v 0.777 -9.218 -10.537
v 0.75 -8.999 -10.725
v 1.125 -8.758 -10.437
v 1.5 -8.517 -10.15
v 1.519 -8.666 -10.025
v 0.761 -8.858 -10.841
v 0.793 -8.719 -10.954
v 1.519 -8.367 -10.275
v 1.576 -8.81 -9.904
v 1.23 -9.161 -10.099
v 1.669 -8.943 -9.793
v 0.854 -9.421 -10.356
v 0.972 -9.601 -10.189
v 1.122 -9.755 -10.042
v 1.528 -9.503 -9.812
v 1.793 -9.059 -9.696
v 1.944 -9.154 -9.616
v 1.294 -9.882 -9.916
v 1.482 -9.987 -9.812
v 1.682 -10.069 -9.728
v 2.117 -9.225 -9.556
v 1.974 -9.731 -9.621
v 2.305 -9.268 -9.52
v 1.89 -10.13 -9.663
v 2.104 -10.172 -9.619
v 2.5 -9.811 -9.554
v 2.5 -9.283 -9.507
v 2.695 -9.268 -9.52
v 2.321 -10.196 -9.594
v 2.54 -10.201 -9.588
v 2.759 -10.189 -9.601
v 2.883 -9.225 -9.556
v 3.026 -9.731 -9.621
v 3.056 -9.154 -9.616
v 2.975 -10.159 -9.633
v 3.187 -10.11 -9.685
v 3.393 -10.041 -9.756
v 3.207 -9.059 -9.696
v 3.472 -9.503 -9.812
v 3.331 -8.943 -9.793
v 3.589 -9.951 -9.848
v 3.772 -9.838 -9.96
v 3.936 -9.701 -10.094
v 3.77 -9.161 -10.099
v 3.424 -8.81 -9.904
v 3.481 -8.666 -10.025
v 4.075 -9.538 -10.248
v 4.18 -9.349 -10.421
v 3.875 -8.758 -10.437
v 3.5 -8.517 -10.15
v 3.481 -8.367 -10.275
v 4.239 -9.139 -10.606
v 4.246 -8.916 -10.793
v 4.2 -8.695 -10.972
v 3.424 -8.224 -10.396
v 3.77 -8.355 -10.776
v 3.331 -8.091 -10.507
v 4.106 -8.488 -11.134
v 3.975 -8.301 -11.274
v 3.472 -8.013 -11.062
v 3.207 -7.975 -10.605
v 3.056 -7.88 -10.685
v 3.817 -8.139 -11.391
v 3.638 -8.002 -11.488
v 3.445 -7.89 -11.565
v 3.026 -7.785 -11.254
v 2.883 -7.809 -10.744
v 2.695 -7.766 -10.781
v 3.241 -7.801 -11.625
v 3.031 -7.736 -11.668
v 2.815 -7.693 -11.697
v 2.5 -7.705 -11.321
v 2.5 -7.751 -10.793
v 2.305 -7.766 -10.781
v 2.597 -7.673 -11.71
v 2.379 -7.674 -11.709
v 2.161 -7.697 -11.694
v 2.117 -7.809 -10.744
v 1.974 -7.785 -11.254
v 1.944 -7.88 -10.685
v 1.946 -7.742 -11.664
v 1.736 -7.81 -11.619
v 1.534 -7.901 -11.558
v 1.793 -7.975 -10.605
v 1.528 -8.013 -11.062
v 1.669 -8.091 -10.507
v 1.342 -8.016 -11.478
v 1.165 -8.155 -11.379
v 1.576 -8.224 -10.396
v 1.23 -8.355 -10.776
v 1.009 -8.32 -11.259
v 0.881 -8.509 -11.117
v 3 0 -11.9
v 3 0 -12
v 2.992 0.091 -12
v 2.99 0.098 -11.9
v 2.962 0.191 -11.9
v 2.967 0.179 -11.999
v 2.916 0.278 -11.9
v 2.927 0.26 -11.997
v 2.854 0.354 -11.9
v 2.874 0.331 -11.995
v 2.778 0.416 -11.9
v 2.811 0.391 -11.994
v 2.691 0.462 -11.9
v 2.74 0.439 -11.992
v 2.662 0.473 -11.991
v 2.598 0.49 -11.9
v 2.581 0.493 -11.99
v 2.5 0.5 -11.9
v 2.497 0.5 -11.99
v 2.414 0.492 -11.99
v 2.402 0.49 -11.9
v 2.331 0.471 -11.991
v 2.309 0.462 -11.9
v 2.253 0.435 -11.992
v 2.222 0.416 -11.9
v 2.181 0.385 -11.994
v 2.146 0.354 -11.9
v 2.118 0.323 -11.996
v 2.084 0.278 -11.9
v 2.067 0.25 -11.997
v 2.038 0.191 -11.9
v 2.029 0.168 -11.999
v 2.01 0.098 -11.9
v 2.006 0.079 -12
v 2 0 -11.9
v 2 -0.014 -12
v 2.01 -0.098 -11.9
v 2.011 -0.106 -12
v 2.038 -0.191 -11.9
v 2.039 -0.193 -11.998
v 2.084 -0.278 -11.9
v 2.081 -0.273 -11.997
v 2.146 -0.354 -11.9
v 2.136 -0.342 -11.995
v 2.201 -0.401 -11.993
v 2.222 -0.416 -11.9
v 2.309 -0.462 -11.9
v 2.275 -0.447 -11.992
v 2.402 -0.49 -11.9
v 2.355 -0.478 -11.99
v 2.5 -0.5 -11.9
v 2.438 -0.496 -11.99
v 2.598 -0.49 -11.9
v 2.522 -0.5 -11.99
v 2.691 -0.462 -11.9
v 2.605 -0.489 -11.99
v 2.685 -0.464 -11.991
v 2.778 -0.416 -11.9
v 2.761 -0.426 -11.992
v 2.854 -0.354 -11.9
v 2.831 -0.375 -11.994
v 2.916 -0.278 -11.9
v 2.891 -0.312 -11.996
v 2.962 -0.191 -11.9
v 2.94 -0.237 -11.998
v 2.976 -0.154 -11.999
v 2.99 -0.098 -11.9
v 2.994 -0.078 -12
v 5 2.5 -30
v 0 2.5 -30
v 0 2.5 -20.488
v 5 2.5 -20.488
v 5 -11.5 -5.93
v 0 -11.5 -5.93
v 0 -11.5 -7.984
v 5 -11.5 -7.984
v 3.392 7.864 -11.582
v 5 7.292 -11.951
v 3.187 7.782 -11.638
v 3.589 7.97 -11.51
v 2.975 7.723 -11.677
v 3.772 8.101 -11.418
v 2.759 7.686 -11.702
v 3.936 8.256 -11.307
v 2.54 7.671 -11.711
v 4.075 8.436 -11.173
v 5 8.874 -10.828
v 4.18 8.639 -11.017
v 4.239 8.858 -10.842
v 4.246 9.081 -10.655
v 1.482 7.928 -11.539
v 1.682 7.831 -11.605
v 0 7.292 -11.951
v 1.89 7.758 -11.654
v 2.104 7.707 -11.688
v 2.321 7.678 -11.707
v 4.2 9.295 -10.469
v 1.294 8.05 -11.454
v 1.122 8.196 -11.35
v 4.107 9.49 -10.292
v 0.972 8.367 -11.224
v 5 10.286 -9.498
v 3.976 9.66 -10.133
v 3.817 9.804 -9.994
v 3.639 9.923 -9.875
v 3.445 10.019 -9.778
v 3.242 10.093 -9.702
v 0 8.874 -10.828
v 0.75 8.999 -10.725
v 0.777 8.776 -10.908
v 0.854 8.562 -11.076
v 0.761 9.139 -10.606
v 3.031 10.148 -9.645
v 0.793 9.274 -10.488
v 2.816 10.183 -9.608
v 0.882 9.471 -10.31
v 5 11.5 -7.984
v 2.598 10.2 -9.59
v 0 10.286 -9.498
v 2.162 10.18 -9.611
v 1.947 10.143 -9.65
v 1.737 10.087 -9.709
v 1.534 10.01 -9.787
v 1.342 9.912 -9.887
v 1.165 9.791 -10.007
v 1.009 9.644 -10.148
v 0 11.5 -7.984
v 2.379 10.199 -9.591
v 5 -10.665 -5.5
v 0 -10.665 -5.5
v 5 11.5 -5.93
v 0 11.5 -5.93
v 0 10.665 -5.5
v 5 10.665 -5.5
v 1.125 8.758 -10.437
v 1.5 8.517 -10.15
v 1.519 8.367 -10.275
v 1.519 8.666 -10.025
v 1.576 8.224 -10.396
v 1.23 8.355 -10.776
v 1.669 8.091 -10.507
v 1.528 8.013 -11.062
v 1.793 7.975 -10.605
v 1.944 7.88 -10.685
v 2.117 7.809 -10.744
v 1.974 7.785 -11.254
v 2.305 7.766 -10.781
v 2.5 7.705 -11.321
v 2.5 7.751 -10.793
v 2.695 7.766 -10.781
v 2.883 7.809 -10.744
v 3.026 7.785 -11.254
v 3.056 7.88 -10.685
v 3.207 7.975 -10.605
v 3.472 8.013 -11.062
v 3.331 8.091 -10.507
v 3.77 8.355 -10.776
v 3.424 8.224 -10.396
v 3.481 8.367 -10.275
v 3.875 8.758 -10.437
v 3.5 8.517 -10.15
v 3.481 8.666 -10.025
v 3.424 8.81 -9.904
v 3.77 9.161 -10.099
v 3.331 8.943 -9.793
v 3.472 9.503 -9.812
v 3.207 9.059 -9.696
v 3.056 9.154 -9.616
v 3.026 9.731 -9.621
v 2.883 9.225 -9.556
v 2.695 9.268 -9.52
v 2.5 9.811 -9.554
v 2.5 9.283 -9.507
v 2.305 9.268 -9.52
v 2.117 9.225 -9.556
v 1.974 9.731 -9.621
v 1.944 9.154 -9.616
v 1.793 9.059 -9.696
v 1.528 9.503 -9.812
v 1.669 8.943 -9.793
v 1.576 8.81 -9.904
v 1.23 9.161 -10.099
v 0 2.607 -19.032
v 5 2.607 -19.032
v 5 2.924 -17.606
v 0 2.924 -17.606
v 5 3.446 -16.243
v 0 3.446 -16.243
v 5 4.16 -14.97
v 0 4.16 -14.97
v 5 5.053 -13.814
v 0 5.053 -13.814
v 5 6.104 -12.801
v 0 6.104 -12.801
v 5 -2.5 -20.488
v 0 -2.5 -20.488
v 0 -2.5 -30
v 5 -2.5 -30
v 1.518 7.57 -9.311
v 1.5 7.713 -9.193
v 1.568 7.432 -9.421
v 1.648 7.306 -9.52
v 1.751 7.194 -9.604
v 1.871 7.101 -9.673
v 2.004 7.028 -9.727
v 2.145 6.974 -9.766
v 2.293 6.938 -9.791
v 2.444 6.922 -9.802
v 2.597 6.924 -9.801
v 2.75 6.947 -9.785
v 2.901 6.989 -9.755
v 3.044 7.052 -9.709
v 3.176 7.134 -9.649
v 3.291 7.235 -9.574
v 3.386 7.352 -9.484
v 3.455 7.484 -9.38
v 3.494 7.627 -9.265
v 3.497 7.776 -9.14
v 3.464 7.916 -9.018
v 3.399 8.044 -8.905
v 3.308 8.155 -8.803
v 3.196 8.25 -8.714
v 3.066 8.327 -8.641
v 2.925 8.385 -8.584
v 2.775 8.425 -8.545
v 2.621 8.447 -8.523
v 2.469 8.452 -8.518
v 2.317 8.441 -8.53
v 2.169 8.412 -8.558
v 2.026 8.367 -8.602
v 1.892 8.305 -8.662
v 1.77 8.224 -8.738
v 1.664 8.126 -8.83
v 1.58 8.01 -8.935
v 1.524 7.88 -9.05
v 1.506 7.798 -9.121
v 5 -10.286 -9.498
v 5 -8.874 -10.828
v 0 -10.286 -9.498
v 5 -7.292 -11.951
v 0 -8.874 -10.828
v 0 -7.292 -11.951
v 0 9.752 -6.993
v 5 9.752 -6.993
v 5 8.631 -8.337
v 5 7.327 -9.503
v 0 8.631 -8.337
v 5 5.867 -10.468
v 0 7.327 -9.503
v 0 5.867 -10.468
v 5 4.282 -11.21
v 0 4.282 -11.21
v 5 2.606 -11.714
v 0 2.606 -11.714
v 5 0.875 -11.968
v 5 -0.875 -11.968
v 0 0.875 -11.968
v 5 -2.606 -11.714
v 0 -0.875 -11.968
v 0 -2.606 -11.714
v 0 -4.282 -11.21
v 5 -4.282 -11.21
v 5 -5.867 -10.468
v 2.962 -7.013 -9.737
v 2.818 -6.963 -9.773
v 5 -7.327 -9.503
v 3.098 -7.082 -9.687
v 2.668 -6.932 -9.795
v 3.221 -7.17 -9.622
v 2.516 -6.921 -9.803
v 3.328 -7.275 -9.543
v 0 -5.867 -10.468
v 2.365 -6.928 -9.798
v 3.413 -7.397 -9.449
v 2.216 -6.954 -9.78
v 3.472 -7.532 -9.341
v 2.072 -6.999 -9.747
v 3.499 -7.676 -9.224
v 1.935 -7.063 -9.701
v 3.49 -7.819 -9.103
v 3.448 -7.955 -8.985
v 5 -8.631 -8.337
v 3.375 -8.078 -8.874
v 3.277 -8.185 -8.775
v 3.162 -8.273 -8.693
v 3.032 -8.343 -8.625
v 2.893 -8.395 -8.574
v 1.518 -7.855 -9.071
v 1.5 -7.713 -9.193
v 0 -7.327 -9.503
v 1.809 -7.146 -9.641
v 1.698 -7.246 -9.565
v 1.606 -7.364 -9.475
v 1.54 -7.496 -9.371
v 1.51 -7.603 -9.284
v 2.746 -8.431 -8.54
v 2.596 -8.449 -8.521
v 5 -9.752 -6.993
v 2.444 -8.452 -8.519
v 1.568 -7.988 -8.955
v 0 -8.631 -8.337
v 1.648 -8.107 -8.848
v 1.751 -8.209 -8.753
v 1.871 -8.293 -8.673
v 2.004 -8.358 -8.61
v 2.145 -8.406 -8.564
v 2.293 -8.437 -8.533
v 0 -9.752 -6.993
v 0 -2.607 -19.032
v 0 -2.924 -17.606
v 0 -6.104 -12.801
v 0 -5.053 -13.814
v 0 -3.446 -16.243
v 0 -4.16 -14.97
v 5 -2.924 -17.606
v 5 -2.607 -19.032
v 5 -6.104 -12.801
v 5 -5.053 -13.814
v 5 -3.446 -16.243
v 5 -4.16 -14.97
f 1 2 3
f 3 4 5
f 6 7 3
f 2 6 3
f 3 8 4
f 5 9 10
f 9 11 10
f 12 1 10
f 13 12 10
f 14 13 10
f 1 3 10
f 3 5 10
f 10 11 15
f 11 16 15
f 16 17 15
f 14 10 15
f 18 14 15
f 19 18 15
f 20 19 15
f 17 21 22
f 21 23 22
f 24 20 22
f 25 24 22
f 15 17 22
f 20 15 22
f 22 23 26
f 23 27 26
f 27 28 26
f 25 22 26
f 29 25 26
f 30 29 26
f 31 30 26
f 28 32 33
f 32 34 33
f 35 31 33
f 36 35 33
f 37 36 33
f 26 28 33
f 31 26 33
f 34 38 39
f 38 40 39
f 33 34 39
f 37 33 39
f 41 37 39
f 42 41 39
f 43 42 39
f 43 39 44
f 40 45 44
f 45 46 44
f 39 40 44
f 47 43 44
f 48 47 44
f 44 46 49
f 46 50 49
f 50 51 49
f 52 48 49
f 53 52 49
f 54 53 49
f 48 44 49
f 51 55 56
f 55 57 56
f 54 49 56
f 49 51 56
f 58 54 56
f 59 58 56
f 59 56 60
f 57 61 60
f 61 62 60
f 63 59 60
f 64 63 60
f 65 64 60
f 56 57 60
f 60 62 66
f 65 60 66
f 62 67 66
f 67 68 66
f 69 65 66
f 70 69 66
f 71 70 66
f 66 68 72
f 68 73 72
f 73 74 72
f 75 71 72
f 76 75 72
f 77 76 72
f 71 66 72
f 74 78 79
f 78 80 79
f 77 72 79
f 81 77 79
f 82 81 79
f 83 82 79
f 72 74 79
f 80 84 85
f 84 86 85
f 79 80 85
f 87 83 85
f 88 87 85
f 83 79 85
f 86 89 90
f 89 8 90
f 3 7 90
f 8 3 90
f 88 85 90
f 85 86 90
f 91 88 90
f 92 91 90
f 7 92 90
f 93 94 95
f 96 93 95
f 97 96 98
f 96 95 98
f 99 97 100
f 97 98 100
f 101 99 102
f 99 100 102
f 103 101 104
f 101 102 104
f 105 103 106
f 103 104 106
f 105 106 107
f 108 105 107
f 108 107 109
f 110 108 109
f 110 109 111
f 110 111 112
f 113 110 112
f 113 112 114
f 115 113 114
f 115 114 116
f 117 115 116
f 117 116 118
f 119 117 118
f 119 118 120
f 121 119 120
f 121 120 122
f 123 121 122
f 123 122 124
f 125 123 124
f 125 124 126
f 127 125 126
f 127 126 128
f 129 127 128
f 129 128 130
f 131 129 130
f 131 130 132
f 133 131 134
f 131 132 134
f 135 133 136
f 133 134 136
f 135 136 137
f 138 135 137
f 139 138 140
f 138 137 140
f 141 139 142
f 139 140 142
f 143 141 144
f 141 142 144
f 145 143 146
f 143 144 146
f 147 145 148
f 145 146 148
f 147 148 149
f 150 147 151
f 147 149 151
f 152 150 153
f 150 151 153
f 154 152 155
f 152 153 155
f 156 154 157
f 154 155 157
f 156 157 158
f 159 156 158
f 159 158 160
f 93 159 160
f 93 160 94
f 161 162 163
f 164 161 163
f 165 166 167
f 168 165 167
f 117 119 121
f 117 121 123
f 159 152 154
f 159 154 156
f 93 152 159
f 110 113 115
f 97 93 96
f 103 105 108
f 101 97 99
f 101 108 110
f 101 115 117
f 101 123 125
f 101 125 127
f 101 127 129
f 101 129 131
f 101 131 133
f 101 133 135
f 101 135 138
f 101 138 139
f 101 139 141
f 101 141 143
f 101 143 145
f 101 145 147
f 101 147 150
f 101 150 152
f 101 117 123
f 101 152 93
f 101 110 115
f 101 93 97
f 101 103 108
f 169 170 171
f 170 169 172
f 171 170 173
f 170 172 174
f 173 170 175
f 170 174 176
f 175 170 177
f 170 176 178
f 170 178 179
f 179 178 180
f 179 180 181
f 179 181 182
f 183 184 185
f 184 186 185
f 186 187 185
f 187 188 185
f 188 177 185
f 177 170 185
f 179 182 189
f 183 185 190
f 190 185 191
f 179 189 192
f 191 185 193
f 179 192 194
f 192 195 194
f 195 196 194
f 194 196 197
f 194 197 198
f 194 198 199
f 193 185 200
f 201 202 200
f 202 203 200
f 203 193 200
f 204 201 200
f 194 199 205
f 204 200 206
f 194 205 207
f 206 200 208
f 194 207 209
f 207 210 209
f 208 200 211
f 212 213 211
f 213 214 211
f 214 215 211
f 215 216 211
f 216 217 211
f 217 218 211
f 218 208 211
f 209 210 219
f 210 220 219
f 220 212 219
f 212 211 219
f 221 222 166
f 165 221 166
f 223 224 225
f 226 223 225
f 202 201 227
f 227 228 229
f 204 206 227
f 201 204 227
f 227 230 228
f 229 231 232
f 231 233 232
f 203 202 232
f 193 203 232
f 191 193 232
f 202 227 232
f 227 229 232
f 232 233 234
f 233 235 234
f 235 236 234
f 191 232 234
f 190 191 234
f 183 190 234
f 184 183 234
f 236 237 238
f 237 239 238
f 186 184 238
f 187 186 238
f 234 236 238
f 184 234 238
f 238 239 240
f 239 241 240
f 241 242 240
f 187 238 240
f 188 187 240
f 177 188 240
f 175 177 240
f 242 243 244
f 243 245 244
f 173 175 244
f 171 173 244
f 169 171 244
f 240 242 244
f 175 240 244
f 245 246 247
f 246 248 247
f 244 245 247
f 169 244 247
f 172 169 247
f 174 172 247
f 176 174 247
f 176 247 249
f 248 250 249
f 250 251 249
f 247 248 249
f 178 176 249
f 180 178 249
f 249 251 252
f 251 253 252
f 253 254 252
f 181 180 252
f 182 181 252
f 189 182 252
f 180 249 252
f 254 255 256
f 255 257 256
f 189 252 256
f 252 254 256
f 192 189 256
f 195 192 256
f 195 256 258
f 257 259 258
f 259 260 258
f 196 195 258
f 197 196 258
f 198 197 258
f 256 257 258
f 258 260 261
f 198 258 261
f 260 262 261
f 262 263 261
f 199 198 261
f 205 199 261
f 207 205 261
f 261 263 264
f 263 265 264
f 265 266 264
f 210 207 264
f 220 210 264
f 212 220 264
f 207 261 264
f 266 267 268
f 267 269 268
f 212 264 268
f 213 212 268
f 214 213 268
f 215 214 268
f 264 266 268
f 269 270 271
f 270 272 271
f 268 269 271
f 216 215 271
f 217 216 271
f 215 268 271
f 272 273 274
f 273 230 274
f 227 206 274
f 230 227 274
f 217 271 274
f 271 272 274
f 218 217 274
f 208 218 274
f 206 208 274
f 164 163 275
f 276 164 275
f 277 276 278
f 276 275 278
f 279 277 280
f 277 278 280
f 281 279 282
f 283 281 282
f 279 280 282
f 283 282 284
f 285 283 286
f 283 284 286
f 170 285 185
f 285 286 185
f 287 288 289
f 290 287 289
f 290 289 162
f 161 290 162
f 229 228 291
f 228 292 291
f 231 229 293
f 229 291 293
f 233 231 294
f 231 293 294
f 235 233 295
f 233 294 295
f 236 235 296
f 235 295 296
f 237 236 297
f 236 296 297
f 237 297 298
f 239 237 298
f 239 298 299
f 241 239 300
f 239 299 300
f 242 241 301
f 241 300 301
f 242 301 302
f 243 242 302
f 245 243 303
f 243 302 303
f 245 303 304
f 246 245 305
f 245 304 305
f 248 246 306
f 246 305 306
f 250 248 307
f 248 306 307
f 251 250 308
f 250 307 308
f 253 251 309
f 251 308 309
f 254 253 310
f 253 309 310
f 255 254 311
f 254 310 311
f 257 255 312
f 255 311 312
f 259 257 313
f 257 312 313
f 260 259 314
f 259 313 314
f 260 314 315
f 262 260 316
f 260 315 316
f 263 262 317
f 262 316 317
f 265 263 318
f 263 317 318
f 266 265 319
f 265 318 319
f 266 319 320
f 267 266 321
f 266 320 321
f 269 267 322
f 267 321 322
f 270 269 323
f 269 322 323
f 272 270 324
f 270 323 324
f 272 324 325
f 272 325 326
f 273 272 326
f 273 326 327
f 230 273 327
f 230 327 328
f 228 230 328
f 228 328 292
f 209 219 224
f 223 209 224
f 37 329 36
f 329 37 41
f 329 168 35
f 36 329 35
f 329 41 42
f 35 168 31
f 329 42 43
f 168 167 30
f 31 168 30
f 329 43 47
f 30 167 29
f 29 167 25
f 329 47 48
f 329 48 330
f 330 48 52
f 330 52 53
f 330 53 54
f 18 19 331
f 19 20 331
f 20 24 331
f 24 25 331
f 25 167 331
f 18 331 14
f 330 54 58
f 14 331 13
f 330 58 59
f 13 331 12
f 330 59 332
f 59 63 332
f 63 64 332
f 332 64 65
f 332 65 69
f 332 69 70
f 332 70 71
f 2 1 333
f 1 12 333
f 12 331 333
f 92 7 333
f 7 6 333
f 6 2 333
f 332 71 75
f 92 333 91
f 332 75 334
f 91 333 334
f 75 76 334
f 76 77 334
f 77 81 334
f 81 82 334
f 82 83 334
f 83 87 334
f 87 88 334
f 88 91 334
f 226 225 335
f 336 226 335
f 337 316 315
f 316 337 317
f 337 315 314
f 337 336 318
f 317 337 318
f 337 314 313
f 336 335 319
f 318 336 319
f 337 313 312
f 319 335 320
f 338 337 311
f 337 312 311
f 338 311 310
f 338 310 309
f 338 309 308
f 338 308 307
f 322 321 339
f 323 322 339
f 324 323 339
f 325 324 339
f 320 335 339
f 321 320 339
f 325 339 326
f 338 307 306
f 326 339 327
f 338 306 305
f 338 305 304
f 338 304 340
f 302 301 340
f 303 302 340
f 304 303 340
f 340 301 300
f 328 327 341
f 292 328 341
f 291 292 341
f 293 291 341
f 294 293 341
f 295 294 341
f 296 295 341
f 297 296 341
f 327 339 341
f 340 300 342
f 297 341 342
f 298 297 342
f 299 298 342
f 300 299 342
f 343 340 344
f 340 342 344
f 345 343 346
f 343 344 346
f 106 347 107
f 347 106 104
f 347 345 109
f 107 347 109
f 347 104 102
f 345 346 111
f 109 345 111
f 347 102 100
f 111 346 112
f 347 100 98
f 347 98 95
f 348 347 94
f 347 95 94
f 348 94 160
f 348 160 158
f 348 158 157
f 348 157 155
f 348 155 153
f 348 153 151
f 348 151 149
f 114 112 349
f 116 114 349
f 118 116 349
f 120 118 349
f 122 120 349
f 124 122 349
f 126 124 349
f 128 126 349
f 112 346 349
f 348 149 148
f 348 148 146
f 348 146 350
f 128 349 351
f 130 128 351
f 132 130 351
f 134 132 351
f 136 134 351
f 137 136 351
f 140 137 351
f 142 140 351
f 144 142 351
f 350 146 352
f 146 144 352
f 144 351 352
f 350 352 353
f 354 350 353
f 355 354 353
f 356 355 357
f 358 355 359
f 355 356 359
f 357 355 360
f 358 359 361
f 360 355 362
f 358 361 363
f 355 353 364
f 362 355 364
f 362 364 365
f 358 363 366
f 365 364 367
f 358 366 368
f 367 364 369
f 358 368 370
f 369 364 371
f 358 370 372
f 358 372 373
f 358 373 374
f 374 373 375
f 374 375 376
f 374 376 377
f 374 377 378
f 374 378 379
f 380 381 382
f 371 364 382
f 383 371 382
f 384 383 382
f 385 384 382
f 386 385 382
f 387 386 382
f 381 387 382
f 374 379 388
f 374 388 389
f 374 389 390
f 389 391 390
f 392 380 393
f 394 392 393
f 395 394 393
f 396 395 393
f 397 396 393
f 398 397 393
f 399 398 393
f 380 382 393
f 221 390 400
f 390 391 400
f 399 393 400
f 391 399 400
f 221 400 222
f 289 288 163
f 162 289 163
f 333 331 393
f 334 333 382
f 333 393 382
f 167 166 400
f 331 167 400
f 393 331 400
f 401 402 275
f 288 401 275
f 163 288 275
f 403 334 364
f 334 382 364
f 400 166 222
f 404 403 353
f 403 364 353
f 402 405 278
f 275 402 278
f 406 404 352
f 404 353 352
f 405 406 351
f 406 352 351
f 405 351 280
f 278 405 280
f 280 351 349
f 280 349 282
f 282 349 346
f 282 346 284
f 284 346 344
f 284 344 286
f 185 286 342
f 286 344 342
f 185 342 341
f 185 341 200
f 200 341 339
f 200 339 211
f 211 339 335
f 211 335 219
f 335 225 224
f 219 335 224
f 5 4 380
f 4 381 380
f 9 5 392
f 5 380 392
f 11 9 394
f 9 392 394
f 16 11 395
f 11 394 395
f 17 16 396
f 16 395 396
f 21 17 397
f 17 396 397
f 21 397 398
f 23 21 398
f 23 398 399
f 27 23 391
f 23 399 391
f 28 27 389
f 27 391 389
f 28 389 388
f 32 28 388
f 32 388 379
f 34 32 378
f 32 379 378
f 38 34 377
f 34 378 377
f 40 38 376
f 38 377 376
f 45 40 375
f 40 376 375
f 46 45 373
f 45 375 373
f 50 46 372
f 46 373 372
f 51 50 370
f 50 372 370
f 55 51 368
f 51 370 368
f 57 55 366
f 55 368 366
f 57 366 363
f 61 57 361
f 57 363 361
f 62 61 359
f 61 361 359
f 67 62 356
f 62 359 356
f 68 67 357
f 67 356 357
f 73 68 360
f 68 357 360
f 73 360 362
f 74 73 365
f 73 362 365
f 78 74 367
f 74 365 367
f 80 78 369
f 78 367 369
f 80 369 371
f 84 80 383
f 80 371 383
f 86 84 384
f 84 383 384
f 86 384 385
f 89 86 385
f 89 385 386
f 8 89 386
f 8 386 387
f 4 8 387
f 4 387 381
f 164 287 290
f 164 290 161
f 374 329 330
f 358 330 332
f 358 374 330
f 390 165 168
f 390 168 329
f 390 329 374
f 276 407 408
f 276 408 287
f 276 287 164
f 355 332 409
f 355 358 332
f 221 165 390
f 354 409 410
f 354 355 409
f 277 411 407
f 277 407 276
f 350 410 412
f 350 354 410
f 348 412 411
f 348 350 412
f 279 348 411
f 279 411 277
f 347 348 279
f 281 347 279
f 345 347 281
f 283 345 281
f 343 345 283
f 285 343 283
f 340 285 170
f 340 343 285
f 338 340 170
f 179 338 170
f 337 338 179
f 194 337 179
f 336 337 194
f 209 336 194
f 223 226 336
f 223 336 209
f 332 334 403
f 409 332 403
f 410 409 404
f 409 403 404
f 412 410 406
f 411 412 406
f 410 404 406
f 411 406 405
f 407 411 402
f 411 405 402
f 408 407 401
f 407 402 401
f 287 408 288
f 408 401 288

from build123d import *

# Parameters (mm, degrees)
F1_DEPTH       = 5
F5_D           = 2
F5_DEPTH       = 5
F5_CSINK_D     = 3.5
F5_CSINK_ANGLE = 90
F8_D           = 2
F8_DEPTH       = 5
F8_CSINK_D     = 3.5
F8_CSINK_ANGLE = 90
F10_R          = 0.5
F11_DEPTH      = 0.1


with BuildPart() as f1:
    # F0 (on Right) → F1 (new body)
    with BuildSketch(Plane.YZ):
        with BuildLine():
            ThreePointArc((2.5, -20.487801), (3.779813, -15.593076), (7.291667, -11.951217))
            ThreePointArc((7.291667, -11.951217), (9.602899, -10.187459), (11.5, -7.98436))
            Line((11.5, -7.98436), (11.5, -5.930411))
            Line((11.5, -5.930411), (10.665365, -5.5))
            ThreePointArc((10.665365, -5.5), (0, -12), (-10.665365, -5.5))
            Line((-10.665365, -5.5), (-11.5, -5.930411))
            Line((-11.5, -5.930411), (-11.5, -7.98436))
            ThreePointArc((-11.5, -7.98436), (-9.602899, -10.187459), (-7.291667, -11.951217))
            ThreePointArc((-7.291667, -11.951217), (-3.779813, -15.593076), (-2.5, -20.487801))
            Line((-2.5, -20.487801), (-2.5, -30))
            Line((-2.5, -30), (2.5, -30))
            Line((2.5, -30), (2.5, -20.487801))
        make_face()
    extrude(amount=F1_DEPTH)

    # F5
    with Locations(Plane(origin=(0, 8.999027, -10.724622), x_dir=(1, 0, 0), z_dir=(0, 0.642788, -0.766044))):
        with Locations((2.5, 0)):
            CounterSinkHole(F5_D / 2, F5_CSINK_D / 2, depth=F5_DEPTH, counter_sink_angle=F5_CSINK_ANGLE)

    # F8
    with Locations(Plane(origin=(0, -8.999027, -10.724622), x_dir=(1, 0, 0), z_dir=(0, -0.642788, -0.766044))):
        with Locations((2.5, 0)):
            CounterSinkHole(F8_D / 2, F8_CSINK_D / 2, depth=F8_DEPTH, counter_sink_angle=F8_CSINK_ANGLE)

    # F10 (on offset) → F11 (join)
    with BuildSketch(Plane.XY.offset(-12)):
        with Locations((2.5, 0)):
            Circle(F10_R)
    extrude(amount=F11_DEPTH)


solid = f1.part
